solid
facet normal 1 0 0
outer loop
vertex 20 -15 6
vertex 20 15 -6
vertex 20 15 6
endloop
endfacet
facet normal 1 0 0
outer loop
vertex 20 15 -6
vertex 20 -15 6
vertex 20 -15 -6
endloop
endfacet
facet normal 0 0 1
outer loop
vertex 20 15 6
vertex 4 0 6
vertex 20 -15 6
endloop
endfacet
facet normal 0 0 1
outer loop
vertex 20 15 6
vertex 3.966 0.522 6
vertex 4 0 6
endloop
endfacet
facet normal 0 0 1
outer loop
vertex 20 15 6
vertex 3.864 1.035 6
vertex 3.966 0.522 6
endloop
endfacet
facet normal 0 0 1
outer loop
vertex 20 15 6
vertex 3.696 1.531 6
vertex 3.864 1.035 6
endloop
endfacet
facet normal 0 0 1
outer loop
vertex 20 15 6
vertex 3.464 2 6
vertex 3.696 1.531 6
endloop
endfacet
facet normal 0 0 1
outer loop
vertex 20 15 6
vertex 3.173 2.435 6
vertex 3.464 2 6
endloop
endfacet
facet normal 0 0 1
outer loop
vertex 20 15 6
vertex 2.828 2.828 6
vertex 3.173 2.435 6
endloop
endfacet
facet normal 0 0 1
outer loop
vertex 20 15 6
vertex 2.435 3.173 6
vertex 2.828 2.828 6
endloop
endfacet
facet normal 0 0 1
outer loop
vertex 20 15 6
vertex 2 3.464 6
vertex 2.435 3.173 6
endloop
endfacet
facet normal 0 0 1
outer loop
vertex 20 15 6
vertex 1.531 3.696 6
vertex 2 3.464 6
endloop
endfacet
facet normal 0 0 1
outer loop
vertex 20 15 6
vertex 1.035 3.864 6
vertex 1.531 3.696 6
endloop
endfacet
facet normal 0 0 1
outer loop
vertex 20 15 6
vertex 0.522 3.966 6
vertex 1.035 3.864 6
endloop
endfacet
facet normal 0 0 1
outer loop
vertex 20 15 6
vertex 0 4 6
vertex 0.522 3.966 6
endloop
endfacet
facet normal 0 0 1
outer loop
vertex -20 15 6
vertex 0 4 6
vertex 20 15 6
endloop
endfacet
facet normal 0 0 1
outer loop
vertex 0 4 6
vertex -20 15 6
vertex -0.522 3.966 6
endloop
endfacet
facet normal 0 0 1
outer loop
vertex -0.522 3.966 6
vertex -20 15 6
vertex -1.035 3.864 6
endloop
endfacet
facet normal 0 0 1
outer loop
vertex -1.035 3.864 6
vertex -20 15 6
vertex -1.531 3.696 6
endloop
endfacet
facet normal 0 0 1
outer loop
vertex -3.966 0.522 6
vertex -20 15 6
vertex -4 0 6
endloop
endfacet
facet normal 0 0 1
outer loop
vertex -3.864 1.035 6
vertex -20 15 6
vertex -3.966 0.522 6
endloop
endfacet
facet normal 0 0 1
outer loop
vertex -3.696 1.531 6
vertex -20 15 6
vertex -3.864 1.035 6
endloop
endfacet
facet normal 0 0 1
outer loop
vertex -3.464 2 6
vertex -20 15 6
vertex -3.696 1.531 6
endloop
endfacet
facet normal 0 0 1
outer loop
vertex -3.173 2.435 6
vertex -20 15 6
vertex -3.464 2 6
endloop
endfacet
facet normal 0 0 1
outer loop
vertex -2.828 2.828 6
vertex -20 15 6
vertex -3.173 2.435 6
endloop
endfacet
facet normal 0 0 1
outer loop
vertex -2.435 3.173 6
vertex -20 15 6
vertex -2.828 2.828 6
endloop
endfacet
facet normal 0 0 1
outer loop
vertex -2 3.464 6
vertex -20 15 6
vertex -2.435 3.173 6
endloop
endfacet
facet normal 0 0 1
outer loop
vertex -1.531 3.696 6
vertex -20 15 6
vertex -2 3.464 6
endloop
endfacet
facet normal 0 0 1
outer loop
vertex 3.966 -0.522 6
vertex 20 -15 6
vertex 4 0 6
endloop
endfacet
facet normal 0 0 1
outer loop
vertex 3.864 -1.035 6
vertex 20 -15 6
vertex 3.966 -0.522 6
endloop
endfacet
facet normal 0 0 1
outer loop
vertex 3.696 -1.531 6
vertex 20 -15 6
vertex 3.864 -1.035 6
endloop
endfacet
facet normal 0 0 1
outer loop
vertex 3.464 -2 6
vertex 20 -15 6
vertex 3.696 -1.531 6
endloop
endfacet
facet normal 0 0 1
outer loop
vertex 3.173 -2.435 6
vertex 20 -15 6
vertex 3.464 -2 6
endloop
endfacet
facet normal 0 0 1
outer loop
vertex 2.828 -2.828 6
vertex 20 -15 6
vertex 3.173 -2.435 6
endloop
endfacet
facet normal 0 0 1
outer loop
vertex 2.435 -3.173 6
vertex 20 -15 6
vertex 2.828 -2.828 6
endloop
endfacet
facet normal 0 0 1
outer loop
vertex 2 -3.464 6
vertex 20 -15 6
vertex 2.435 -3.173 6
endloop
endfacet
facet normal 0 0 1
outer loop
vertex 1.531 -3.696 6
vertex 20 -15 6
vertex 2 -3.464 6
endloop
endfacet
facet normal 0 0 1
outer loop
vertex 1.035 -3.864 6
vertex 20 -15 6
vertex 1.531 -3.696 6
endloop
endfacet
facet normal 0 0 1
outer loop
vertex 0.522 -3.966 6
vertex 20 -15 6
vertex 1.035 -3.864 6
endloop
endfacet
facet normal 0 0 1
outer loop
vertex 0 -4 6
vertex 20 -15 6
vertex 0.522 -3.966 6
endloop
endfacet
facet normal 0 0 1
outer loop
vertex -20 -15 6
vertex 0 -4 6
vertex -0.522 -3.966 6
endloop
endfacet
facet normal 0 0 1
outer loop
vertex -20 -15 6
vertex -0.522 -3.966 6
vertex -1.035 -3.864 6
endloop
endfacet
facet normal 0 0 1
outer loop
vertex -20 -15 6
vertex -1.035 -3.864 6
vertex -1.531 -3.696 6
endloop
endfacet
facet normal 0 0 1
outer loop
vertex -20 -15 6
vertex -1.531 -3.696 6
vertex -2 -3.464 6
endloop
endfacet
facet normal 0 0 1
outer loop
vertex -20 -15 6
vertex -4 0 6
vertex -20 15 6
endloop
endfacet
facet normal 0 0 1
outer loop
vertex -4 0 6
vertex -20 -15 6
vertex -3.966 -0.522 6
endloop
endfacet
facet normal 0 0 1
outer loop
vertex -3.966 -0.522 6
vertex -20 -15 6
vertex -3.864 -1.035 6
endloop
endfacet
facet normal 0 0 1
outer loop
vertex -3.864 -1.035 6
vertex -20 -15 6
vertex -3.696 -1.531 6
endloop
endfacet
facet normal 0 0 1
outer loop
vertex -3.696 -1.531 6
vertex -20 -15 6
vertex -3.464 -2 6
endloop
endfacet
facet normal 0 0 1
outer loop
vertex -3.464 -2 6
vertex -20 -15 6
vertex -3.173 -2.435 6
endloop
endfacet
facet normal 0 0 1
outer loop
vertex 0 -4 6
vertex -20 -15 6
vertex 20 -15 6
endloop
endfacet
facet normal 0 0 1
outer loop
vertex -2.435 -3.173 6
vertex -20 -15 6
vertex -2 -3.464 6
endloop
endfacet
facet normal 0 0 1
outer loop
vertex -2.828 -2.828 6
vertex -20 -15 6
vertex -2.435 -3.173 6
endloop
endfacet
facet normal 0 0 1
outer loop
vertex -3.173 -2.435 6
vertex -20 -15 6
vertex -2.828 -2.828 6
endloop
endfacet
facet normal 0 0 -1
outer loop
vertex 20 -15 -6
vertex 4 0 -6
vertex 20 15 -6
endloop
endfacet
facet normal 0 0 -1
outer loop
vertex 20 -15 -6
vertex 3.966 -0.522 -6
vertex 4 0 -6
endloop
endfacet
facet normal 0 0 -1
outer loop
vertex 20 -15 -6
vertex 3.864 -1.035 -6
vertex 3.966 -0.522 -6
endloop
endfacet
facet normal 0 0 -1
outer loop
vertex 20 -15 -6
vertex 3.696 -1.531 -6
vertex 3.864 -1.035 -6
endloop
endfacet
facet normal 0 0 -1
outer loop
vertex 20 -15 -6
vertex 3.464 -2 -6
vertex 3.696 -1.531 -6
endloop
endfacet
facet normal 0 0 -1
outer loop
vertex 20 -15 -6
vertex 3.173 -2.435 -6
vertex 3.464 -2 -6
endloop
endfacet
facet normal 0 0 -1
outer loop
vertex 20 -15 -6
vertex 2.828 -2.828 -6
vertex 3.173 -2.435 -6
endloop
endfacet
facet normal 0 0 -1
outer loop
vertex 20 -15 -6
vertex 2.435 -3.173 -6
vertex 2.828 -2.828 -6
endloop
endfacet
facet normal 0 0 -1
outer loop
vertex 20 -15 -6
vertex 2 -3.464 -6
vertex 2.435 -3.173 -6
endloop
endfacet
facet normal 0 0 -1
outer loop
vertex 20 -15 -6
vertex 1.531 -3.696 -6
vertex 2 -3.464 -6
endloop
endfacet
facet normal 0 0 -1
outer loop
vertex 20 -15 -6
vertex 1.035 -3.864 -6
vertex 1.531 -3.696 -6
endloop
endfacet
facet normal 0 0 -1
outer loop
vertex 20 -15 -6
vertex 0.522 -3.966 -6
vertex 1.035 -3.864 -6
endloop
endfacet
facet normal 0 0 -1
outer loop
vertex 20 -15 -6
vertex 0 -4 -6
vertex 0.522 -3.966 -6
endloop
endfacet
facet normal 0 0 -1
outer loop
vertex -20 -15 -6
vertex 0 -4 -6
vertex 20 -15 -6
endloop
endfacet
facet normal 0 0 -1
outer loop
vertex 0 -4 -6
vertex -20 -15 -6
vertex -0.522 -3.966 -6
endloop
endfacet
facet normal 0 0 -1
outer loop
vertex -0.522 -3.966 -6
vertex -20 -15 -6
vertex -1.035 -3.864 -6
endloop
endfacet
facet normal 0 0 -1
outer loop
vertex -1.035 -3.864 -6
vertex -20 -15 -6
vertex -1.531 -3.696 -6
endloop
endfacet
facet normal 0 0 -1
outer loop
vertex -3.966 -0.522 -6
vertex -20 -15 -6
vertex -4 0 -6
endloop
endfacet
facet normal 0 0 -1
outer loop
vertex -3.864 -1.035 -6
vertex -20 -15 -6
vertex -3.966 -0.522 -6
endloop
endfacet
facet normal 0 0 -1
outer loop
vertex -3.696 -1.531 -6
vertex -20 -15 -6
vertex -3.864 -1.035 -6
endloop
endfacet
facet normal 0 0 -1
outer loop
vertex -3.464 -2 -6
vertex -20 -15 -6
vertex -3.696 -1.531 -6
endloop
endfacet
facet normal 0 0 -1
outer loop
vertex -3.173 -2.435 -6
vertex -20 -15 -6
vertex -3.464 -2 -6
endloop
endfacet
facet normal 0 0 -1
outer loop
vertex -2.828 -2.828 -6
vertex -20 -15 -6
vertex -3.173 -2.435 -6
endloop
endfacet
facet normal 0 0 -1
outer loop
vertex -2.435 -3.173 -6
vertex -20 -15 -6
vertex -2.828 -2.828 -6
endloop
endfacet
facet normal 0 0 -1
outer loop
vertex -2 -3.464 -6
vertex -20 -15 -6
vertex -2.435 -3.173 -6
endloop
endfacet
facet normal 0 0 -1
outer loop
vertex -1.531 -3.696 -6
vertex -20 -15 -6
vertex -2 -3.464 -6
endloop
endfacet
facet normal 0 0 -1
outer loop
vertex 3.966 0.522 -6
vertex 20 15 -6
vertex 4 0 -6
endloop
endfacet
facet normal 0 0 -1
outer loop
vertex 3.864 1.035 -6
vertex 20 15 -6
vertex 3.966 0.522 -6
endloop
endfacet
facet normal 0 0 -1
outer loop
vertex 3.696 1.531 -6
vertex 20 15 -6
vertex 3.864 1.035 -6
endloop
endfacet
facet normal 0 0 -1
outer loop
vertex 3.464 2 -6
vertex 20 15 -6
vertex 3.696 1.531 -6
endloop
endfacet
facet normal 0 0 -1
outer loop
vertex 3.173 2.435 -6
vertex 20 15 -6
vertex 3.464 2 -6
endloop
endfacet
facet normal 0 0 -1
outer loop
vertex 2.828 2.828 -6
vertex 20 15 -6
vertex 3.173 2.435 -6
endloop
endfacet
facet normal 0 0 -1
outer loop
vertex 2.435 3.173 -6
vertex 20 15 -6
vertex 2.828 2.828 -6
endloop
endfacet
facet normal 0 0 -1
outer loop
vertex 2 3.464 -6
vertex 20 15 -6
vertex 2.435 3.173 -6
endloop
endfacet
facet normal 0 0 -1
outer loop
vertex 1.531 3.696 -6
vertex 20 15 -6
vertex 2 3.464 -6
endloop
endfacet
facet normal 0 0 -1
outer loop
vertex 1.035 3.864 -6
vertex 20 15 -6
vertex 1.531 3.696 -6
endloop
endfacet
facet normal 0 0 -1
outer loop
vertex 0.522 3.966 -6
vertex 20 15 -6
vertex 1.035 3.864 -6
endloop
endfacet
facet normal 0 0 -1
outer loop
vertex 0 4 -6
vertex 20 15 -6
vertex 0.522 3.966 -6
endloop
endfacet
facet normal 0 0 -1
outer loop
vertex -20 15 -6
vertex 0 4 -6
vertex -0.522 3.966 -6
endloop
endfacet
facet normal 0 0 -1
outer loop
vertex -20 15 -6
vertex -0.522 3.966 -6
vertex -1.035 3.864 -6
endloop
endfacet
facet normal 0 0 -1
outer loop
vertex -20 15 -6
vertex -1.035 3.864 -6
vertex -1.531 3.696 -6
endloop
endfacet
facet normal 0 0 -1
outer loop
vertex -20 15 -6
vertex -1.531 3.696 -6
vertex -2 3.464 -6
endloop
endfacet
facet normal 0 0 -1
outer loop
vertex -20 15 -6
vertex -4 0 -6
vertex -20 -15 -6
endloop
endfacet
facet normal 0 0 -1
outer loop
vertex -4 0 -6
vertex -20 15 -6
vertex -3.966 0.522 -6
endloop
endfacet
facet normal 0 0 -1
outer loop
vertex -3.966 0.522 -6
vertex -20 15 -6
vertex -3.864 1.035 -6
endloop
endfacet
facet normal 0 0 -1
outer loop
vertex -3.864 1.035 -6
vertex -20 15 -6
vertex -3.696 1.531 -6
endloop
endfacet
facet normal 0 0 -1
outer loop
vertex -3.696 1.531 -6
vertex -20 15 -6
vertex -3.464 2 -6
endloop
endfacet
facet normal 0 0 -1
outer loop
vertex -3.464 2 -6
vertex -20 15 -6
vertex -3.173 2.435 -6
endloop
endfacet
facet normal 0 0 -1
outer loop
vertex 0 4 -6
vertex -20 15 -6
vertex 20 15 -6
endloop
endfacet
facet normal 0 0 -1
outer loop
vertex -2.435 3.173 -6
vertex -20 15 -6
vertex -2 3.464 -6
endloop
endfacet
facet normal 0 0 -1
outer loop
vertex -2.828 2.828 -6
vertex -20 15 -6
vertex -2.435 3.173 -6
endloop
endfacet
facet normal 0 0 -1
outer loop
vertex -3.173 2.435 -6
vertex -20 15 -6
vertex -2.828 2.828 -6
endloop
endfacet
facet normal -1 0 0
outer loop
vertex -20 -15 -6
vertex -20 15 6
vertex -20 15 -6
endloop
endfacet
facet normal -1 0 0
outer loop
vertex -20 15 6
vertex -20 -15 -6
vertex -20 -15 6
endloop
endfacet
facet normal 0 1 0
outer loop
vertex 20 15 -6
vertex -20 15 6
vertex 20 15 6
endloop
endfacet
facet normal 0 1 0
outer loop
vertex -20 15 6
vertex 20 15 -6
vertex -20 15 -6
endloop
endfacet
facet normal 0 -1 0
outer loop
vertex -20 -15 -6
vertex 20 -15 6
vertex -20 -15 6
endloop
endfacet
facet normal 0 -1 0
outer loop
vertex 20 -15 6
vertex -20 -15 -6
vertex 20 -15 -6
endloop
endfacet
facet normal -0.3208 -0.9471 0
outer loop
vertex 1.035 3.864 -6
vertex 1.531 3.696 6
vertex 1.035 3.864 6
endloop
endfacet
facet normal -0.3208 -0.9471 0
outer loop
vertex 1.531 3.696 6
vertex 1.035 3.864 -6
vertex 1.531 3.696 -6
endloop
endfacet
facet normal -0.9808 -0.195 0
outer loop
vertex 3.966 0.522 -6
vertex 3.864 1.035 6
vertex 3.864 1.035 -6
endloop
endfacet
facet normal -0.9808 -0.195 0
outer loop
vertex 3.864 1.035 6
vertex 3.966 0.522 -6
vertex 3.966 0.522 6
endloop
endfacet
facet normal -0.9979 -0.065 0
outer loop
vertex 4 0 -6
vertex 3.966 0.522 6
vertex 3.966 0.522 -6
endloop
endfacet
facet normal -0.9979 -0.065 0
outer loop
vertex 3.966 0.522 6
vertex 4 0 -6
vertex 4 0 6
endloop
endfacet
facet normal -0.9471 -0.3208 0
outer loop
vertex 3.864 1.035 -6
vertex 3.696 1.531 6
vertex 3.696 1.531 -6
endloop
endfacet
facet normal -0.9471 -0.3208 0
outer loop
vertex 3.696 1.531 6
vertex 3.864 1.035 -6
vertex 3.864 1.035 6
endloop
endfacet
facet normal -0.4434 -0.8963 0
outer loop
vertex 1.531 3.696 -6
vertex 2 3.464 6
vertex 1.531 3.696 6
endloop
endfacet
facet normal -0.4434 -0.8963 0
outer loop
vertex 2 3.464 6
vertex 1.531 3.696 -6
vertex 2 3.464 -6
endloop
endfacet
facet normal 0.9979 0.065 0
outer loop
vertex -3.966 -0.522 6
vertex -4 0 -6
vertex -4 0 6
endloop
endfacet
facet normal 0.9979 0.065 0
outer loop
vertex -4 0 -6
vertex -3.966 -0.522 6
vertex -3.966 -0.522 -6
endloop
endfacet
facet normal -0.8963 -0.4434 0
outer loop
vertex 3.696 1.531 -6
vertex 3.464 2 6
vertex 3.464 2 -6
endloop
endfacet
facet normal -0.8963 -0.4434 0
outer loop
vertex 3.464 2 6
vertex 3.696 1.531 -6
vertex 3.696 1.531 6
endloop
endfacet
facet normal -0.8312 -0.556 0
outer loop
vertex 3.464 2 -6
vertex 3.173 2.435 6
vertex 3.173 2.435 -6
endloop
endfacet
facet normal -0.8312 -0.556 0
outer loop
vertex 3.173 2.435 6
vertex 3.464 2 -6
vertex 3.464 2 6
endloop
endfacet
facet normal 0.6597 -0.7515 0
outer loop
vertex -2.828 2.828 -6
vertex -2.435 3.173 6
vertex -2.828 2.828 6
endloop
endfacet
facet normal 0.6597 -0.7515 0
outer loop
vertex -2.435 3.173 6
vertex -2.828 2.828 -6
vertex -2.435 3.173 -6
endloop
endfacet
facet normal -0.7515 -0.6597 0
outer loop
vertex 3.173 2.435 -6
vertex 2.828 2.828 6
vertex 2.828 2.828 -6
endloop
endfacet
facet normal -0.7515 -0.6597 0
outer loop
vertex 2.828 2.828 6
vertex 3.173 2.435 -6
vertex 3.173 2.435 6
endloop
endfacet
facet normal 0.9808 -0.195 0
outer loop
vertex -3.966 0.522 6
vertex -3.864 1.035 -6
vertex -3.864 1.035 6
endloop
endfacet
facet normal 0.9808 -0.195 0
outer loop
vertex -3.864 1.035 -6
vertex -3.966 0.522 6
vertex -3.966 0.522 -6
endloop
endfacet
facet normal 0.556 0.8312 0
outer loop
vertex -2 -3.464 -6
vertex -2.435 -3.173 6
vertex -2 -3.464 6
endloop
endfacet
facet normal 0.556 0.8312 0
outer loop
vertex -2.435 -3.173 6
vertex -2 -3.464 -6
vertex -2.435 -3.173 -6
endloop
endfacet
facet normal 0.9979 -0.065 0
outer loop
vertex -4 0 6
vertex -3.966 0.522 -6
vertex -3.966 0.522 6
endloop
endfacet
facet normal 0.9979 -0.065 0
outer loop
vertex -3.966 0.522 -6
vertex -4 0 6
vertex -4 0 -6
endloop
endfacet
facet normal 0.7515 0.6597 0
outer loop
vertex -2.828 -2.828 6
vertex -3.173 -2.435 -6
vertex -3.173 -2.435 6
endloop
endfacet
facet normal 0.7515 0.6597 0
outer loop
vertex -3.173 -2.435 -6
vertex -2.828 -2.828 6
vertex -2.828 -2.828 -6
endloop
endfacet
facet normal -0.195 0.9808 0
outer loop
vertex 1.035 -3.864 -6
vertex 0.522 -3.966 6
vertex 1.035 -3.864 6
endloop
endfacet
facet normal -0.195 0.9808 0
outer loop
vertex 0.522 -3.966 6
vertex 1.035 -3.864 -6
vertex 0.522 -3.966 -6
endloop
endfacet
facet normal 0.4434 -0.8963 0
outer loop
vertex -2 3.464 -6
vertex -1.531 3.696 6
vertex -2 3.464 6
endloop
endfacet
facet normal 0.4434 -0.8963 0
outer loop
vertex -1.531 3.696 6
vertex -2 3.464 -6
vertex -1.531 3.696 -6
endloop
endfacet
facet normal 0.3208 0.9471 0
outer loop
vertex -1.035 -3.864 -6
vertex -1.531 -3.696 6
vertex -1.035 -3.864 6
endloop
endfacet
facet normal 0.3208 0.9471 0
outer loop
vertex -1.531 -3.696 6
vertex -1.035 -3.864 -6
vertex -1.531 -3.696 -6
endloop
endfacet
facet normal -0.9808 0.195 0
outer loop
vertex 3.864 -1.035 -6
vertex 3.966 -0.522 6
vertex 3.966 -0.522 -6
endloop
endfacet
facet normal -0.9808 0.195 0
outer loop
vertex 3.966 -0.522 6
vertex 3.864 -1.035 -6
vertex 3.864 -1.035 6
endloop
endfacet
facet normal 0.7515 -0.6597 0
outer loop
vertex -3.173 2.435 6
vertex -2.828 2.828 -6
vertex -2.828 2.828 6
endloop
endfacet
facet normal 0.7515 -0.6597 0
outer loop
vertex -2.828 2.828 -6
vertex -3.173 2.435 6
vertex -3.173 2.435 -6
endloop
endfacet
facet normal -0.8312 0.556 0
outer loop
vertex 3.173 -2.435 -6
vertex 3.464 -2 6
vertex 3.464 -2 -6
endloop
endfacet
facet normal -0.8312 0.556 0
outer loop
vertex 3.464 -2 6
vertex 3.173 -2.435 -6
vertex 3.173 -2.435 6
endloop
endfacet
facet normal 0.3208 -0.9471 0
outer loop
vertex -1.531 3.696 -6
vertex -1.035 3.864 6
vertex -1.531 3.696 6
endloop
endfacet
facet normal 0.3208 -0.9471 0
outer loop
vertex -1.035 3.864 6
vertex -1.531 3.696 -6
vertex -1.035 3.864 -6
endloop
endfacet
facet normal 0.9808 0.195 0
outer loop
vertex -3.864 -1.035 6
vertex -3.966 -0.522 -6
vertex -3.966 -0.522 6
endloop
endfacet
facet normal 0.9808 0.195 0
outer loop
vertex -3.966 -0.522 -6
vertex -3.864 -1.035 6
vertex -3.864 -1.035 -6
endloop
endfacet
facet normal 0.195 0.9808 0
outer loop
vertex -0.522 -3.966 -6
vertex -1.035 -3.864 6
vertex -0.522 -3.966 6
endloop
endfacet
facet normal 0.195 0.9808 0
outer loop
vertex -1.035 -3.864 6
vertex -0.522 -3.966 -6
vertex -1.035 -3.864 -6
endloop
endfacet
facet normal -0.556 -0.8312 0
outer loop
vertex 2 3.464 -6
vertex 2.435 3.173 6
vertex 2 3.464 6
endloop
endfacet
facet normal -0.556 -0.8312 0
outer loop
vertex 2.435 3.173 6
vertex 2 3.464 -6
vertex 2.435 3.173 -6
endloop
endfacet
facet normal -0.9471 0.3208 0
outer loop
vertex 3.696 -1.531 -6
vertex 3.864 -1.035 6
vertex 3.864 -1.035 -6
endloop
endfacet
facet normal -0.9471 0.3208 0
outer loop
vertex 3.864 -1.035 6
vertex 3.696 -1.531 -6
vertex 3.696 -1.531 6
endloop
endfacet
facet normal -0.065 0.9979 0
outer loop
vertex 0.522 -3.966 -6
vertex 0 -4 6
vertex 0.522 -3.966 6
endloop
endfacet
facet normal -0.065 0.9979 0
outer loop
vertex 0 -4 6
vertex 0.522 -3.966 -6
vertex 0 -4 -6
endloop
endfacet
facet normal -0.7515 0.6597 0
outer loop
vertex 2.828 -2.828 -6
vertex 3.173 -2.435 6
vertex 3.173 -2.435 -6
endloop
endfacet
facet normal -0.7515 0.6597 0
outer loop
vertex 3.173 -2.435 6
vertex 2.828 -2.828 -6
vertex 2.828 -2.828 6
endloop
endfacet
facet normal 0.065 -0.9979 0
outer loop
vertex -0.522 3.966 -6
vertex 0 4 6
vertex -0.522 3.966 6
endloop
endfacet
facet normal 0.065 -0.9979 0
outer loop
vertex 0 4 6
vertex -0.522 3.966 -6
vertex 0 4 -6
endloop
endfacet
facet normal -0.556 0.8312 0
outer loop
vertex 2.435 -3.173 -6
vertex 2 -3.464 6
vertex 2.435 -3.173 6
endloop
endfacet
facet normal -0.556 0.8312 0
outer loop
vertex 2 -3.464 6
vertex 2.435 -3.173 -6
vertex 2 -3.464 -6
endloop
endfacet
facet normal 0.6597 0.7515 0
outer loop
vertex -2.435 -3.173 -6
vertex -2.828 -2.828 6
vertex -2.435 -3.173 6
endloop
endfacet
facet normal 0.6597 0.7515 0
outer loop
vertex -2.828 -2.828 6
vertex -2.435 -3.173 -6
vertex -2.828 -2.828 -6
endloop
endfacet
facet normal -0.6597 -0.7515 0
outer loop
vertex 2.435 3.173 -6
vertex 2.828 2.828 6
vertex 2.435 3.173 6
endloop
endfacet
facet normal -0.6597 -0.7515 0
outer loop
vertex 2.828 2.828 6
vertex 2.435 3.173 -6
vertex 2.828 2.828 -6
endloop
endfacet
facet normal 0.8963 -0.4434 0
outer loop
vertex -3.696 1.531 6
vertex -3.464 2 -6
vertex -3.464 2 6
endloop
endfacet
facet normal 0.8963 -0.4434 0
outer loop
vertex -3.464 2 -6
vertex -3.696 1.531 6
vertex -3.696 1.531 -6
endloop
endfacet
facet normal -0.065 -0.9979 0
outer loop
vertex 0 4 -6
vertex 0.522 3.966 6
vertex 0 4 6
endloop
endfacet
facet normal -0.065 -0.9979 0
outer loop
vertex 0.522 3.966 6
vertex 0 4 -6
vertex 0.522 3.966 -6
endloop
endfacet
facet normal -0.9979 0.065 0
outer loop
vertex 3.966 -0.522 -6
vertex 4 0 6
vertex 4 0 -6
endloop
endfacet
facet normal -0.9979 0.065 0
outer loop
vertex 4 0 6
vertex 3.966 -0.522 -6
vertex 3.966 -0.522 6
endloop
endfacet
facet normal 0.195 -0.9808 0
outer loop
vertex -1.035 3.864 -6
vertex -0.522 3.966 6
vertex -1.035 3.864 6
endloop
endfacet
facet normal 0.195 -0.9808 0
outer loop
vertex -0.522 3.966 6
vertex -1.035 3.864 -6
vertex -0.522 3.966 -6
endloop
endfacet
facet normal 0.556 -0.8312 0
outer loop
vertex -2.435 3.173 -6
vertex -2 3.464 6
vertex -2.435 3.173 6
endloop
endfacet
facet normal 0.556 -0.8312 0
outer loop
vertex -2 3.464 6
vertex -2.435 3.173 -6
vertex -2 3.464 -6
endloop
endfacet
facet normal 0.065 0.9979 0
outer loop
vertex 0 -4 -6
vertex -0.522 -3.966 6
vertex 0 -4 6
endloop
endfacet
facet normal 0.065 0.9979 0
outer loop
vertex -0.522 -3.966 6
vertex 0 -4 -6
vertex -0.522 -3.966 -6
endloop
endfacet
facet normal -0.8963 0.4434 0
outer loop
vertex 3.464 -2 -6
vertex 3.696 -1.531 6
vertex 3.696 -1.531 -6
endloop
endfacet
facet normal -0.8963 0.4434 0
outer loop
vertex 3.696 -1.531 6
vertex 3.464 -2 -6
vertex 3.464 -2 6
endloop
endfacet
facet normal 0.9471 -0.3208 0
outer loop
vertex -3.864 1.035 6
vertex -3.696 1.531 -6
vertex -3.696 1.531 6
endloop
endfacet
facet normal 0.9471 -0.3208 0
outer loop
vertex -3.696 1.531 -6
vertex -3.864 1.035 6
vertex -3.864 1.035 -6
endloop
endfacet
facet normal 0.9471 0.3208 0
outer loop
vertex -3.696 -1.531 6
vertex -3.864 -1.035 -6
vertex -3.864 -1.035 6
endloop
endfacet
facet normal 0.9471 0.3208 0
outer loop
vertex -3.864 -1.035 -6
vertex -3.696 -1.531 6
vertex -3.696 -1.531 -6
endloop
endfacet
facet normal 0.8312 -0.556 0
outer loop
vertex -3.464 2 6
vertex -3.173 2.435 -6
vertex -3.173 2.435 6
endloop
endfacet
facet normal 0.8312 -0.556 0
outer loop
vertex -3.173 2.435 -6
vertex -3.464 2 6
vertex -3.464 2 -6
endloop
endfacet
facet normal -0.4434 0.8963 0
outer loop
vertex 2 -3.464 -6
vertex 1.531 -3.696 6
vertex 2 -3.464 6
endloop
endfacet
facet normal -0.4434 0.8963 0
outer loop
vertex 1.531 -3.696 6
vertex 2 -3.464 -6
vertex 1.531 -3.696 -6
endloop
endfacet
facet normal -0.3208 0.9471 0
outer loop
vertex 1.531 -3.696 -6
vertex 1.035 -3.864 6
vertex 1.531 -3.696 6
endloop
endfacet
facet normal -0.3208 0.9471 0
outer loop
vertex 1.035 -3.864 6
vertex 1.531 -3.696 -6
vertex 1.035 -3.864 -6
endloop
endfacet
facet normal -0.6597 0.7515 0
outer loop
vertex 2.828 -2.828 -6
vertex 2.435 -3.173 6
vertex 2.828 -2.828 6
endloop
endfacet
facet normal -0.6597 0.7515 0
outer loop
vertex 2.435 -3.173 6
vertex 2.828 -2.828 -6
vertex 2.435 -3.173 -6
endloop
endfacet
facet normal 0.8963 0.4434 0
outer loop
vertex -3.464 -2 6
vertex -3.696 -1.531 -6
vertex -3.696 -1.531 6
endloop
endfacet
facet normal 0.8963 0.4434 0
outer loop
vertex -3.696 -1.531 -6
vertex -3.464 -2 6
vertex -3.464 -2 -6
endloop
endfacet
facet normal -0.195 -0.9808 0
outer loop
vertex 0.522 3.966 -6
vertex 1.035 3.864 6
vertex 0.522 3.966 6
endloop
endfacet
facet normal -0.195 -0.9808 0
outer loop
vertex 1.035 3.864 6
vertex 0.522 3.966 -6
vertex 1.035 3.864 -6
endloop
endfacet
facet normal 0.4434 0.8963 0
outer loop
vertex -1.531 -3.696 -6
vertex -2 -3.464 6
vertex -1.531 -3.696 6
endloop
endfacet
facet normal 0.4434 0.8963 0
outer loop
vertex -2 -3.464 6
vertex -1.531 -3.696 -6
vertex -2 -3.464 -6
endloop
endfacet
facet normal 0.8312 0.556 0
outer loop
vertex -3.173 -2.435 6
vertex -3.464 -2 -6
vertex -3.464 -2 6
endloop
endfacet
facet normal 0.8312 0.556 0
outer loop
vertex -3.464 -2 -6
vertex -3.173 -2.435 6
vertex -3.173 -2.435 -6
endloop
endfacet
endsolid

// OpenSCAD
// Simple box with a through hole.
size = [40, 30, 12];
hole_d = 8;
$fn = 48;

difference() {
  cube(size, center = true);
  cylinder(d = hole_d, h = size[2] + 2, center = true);
}
